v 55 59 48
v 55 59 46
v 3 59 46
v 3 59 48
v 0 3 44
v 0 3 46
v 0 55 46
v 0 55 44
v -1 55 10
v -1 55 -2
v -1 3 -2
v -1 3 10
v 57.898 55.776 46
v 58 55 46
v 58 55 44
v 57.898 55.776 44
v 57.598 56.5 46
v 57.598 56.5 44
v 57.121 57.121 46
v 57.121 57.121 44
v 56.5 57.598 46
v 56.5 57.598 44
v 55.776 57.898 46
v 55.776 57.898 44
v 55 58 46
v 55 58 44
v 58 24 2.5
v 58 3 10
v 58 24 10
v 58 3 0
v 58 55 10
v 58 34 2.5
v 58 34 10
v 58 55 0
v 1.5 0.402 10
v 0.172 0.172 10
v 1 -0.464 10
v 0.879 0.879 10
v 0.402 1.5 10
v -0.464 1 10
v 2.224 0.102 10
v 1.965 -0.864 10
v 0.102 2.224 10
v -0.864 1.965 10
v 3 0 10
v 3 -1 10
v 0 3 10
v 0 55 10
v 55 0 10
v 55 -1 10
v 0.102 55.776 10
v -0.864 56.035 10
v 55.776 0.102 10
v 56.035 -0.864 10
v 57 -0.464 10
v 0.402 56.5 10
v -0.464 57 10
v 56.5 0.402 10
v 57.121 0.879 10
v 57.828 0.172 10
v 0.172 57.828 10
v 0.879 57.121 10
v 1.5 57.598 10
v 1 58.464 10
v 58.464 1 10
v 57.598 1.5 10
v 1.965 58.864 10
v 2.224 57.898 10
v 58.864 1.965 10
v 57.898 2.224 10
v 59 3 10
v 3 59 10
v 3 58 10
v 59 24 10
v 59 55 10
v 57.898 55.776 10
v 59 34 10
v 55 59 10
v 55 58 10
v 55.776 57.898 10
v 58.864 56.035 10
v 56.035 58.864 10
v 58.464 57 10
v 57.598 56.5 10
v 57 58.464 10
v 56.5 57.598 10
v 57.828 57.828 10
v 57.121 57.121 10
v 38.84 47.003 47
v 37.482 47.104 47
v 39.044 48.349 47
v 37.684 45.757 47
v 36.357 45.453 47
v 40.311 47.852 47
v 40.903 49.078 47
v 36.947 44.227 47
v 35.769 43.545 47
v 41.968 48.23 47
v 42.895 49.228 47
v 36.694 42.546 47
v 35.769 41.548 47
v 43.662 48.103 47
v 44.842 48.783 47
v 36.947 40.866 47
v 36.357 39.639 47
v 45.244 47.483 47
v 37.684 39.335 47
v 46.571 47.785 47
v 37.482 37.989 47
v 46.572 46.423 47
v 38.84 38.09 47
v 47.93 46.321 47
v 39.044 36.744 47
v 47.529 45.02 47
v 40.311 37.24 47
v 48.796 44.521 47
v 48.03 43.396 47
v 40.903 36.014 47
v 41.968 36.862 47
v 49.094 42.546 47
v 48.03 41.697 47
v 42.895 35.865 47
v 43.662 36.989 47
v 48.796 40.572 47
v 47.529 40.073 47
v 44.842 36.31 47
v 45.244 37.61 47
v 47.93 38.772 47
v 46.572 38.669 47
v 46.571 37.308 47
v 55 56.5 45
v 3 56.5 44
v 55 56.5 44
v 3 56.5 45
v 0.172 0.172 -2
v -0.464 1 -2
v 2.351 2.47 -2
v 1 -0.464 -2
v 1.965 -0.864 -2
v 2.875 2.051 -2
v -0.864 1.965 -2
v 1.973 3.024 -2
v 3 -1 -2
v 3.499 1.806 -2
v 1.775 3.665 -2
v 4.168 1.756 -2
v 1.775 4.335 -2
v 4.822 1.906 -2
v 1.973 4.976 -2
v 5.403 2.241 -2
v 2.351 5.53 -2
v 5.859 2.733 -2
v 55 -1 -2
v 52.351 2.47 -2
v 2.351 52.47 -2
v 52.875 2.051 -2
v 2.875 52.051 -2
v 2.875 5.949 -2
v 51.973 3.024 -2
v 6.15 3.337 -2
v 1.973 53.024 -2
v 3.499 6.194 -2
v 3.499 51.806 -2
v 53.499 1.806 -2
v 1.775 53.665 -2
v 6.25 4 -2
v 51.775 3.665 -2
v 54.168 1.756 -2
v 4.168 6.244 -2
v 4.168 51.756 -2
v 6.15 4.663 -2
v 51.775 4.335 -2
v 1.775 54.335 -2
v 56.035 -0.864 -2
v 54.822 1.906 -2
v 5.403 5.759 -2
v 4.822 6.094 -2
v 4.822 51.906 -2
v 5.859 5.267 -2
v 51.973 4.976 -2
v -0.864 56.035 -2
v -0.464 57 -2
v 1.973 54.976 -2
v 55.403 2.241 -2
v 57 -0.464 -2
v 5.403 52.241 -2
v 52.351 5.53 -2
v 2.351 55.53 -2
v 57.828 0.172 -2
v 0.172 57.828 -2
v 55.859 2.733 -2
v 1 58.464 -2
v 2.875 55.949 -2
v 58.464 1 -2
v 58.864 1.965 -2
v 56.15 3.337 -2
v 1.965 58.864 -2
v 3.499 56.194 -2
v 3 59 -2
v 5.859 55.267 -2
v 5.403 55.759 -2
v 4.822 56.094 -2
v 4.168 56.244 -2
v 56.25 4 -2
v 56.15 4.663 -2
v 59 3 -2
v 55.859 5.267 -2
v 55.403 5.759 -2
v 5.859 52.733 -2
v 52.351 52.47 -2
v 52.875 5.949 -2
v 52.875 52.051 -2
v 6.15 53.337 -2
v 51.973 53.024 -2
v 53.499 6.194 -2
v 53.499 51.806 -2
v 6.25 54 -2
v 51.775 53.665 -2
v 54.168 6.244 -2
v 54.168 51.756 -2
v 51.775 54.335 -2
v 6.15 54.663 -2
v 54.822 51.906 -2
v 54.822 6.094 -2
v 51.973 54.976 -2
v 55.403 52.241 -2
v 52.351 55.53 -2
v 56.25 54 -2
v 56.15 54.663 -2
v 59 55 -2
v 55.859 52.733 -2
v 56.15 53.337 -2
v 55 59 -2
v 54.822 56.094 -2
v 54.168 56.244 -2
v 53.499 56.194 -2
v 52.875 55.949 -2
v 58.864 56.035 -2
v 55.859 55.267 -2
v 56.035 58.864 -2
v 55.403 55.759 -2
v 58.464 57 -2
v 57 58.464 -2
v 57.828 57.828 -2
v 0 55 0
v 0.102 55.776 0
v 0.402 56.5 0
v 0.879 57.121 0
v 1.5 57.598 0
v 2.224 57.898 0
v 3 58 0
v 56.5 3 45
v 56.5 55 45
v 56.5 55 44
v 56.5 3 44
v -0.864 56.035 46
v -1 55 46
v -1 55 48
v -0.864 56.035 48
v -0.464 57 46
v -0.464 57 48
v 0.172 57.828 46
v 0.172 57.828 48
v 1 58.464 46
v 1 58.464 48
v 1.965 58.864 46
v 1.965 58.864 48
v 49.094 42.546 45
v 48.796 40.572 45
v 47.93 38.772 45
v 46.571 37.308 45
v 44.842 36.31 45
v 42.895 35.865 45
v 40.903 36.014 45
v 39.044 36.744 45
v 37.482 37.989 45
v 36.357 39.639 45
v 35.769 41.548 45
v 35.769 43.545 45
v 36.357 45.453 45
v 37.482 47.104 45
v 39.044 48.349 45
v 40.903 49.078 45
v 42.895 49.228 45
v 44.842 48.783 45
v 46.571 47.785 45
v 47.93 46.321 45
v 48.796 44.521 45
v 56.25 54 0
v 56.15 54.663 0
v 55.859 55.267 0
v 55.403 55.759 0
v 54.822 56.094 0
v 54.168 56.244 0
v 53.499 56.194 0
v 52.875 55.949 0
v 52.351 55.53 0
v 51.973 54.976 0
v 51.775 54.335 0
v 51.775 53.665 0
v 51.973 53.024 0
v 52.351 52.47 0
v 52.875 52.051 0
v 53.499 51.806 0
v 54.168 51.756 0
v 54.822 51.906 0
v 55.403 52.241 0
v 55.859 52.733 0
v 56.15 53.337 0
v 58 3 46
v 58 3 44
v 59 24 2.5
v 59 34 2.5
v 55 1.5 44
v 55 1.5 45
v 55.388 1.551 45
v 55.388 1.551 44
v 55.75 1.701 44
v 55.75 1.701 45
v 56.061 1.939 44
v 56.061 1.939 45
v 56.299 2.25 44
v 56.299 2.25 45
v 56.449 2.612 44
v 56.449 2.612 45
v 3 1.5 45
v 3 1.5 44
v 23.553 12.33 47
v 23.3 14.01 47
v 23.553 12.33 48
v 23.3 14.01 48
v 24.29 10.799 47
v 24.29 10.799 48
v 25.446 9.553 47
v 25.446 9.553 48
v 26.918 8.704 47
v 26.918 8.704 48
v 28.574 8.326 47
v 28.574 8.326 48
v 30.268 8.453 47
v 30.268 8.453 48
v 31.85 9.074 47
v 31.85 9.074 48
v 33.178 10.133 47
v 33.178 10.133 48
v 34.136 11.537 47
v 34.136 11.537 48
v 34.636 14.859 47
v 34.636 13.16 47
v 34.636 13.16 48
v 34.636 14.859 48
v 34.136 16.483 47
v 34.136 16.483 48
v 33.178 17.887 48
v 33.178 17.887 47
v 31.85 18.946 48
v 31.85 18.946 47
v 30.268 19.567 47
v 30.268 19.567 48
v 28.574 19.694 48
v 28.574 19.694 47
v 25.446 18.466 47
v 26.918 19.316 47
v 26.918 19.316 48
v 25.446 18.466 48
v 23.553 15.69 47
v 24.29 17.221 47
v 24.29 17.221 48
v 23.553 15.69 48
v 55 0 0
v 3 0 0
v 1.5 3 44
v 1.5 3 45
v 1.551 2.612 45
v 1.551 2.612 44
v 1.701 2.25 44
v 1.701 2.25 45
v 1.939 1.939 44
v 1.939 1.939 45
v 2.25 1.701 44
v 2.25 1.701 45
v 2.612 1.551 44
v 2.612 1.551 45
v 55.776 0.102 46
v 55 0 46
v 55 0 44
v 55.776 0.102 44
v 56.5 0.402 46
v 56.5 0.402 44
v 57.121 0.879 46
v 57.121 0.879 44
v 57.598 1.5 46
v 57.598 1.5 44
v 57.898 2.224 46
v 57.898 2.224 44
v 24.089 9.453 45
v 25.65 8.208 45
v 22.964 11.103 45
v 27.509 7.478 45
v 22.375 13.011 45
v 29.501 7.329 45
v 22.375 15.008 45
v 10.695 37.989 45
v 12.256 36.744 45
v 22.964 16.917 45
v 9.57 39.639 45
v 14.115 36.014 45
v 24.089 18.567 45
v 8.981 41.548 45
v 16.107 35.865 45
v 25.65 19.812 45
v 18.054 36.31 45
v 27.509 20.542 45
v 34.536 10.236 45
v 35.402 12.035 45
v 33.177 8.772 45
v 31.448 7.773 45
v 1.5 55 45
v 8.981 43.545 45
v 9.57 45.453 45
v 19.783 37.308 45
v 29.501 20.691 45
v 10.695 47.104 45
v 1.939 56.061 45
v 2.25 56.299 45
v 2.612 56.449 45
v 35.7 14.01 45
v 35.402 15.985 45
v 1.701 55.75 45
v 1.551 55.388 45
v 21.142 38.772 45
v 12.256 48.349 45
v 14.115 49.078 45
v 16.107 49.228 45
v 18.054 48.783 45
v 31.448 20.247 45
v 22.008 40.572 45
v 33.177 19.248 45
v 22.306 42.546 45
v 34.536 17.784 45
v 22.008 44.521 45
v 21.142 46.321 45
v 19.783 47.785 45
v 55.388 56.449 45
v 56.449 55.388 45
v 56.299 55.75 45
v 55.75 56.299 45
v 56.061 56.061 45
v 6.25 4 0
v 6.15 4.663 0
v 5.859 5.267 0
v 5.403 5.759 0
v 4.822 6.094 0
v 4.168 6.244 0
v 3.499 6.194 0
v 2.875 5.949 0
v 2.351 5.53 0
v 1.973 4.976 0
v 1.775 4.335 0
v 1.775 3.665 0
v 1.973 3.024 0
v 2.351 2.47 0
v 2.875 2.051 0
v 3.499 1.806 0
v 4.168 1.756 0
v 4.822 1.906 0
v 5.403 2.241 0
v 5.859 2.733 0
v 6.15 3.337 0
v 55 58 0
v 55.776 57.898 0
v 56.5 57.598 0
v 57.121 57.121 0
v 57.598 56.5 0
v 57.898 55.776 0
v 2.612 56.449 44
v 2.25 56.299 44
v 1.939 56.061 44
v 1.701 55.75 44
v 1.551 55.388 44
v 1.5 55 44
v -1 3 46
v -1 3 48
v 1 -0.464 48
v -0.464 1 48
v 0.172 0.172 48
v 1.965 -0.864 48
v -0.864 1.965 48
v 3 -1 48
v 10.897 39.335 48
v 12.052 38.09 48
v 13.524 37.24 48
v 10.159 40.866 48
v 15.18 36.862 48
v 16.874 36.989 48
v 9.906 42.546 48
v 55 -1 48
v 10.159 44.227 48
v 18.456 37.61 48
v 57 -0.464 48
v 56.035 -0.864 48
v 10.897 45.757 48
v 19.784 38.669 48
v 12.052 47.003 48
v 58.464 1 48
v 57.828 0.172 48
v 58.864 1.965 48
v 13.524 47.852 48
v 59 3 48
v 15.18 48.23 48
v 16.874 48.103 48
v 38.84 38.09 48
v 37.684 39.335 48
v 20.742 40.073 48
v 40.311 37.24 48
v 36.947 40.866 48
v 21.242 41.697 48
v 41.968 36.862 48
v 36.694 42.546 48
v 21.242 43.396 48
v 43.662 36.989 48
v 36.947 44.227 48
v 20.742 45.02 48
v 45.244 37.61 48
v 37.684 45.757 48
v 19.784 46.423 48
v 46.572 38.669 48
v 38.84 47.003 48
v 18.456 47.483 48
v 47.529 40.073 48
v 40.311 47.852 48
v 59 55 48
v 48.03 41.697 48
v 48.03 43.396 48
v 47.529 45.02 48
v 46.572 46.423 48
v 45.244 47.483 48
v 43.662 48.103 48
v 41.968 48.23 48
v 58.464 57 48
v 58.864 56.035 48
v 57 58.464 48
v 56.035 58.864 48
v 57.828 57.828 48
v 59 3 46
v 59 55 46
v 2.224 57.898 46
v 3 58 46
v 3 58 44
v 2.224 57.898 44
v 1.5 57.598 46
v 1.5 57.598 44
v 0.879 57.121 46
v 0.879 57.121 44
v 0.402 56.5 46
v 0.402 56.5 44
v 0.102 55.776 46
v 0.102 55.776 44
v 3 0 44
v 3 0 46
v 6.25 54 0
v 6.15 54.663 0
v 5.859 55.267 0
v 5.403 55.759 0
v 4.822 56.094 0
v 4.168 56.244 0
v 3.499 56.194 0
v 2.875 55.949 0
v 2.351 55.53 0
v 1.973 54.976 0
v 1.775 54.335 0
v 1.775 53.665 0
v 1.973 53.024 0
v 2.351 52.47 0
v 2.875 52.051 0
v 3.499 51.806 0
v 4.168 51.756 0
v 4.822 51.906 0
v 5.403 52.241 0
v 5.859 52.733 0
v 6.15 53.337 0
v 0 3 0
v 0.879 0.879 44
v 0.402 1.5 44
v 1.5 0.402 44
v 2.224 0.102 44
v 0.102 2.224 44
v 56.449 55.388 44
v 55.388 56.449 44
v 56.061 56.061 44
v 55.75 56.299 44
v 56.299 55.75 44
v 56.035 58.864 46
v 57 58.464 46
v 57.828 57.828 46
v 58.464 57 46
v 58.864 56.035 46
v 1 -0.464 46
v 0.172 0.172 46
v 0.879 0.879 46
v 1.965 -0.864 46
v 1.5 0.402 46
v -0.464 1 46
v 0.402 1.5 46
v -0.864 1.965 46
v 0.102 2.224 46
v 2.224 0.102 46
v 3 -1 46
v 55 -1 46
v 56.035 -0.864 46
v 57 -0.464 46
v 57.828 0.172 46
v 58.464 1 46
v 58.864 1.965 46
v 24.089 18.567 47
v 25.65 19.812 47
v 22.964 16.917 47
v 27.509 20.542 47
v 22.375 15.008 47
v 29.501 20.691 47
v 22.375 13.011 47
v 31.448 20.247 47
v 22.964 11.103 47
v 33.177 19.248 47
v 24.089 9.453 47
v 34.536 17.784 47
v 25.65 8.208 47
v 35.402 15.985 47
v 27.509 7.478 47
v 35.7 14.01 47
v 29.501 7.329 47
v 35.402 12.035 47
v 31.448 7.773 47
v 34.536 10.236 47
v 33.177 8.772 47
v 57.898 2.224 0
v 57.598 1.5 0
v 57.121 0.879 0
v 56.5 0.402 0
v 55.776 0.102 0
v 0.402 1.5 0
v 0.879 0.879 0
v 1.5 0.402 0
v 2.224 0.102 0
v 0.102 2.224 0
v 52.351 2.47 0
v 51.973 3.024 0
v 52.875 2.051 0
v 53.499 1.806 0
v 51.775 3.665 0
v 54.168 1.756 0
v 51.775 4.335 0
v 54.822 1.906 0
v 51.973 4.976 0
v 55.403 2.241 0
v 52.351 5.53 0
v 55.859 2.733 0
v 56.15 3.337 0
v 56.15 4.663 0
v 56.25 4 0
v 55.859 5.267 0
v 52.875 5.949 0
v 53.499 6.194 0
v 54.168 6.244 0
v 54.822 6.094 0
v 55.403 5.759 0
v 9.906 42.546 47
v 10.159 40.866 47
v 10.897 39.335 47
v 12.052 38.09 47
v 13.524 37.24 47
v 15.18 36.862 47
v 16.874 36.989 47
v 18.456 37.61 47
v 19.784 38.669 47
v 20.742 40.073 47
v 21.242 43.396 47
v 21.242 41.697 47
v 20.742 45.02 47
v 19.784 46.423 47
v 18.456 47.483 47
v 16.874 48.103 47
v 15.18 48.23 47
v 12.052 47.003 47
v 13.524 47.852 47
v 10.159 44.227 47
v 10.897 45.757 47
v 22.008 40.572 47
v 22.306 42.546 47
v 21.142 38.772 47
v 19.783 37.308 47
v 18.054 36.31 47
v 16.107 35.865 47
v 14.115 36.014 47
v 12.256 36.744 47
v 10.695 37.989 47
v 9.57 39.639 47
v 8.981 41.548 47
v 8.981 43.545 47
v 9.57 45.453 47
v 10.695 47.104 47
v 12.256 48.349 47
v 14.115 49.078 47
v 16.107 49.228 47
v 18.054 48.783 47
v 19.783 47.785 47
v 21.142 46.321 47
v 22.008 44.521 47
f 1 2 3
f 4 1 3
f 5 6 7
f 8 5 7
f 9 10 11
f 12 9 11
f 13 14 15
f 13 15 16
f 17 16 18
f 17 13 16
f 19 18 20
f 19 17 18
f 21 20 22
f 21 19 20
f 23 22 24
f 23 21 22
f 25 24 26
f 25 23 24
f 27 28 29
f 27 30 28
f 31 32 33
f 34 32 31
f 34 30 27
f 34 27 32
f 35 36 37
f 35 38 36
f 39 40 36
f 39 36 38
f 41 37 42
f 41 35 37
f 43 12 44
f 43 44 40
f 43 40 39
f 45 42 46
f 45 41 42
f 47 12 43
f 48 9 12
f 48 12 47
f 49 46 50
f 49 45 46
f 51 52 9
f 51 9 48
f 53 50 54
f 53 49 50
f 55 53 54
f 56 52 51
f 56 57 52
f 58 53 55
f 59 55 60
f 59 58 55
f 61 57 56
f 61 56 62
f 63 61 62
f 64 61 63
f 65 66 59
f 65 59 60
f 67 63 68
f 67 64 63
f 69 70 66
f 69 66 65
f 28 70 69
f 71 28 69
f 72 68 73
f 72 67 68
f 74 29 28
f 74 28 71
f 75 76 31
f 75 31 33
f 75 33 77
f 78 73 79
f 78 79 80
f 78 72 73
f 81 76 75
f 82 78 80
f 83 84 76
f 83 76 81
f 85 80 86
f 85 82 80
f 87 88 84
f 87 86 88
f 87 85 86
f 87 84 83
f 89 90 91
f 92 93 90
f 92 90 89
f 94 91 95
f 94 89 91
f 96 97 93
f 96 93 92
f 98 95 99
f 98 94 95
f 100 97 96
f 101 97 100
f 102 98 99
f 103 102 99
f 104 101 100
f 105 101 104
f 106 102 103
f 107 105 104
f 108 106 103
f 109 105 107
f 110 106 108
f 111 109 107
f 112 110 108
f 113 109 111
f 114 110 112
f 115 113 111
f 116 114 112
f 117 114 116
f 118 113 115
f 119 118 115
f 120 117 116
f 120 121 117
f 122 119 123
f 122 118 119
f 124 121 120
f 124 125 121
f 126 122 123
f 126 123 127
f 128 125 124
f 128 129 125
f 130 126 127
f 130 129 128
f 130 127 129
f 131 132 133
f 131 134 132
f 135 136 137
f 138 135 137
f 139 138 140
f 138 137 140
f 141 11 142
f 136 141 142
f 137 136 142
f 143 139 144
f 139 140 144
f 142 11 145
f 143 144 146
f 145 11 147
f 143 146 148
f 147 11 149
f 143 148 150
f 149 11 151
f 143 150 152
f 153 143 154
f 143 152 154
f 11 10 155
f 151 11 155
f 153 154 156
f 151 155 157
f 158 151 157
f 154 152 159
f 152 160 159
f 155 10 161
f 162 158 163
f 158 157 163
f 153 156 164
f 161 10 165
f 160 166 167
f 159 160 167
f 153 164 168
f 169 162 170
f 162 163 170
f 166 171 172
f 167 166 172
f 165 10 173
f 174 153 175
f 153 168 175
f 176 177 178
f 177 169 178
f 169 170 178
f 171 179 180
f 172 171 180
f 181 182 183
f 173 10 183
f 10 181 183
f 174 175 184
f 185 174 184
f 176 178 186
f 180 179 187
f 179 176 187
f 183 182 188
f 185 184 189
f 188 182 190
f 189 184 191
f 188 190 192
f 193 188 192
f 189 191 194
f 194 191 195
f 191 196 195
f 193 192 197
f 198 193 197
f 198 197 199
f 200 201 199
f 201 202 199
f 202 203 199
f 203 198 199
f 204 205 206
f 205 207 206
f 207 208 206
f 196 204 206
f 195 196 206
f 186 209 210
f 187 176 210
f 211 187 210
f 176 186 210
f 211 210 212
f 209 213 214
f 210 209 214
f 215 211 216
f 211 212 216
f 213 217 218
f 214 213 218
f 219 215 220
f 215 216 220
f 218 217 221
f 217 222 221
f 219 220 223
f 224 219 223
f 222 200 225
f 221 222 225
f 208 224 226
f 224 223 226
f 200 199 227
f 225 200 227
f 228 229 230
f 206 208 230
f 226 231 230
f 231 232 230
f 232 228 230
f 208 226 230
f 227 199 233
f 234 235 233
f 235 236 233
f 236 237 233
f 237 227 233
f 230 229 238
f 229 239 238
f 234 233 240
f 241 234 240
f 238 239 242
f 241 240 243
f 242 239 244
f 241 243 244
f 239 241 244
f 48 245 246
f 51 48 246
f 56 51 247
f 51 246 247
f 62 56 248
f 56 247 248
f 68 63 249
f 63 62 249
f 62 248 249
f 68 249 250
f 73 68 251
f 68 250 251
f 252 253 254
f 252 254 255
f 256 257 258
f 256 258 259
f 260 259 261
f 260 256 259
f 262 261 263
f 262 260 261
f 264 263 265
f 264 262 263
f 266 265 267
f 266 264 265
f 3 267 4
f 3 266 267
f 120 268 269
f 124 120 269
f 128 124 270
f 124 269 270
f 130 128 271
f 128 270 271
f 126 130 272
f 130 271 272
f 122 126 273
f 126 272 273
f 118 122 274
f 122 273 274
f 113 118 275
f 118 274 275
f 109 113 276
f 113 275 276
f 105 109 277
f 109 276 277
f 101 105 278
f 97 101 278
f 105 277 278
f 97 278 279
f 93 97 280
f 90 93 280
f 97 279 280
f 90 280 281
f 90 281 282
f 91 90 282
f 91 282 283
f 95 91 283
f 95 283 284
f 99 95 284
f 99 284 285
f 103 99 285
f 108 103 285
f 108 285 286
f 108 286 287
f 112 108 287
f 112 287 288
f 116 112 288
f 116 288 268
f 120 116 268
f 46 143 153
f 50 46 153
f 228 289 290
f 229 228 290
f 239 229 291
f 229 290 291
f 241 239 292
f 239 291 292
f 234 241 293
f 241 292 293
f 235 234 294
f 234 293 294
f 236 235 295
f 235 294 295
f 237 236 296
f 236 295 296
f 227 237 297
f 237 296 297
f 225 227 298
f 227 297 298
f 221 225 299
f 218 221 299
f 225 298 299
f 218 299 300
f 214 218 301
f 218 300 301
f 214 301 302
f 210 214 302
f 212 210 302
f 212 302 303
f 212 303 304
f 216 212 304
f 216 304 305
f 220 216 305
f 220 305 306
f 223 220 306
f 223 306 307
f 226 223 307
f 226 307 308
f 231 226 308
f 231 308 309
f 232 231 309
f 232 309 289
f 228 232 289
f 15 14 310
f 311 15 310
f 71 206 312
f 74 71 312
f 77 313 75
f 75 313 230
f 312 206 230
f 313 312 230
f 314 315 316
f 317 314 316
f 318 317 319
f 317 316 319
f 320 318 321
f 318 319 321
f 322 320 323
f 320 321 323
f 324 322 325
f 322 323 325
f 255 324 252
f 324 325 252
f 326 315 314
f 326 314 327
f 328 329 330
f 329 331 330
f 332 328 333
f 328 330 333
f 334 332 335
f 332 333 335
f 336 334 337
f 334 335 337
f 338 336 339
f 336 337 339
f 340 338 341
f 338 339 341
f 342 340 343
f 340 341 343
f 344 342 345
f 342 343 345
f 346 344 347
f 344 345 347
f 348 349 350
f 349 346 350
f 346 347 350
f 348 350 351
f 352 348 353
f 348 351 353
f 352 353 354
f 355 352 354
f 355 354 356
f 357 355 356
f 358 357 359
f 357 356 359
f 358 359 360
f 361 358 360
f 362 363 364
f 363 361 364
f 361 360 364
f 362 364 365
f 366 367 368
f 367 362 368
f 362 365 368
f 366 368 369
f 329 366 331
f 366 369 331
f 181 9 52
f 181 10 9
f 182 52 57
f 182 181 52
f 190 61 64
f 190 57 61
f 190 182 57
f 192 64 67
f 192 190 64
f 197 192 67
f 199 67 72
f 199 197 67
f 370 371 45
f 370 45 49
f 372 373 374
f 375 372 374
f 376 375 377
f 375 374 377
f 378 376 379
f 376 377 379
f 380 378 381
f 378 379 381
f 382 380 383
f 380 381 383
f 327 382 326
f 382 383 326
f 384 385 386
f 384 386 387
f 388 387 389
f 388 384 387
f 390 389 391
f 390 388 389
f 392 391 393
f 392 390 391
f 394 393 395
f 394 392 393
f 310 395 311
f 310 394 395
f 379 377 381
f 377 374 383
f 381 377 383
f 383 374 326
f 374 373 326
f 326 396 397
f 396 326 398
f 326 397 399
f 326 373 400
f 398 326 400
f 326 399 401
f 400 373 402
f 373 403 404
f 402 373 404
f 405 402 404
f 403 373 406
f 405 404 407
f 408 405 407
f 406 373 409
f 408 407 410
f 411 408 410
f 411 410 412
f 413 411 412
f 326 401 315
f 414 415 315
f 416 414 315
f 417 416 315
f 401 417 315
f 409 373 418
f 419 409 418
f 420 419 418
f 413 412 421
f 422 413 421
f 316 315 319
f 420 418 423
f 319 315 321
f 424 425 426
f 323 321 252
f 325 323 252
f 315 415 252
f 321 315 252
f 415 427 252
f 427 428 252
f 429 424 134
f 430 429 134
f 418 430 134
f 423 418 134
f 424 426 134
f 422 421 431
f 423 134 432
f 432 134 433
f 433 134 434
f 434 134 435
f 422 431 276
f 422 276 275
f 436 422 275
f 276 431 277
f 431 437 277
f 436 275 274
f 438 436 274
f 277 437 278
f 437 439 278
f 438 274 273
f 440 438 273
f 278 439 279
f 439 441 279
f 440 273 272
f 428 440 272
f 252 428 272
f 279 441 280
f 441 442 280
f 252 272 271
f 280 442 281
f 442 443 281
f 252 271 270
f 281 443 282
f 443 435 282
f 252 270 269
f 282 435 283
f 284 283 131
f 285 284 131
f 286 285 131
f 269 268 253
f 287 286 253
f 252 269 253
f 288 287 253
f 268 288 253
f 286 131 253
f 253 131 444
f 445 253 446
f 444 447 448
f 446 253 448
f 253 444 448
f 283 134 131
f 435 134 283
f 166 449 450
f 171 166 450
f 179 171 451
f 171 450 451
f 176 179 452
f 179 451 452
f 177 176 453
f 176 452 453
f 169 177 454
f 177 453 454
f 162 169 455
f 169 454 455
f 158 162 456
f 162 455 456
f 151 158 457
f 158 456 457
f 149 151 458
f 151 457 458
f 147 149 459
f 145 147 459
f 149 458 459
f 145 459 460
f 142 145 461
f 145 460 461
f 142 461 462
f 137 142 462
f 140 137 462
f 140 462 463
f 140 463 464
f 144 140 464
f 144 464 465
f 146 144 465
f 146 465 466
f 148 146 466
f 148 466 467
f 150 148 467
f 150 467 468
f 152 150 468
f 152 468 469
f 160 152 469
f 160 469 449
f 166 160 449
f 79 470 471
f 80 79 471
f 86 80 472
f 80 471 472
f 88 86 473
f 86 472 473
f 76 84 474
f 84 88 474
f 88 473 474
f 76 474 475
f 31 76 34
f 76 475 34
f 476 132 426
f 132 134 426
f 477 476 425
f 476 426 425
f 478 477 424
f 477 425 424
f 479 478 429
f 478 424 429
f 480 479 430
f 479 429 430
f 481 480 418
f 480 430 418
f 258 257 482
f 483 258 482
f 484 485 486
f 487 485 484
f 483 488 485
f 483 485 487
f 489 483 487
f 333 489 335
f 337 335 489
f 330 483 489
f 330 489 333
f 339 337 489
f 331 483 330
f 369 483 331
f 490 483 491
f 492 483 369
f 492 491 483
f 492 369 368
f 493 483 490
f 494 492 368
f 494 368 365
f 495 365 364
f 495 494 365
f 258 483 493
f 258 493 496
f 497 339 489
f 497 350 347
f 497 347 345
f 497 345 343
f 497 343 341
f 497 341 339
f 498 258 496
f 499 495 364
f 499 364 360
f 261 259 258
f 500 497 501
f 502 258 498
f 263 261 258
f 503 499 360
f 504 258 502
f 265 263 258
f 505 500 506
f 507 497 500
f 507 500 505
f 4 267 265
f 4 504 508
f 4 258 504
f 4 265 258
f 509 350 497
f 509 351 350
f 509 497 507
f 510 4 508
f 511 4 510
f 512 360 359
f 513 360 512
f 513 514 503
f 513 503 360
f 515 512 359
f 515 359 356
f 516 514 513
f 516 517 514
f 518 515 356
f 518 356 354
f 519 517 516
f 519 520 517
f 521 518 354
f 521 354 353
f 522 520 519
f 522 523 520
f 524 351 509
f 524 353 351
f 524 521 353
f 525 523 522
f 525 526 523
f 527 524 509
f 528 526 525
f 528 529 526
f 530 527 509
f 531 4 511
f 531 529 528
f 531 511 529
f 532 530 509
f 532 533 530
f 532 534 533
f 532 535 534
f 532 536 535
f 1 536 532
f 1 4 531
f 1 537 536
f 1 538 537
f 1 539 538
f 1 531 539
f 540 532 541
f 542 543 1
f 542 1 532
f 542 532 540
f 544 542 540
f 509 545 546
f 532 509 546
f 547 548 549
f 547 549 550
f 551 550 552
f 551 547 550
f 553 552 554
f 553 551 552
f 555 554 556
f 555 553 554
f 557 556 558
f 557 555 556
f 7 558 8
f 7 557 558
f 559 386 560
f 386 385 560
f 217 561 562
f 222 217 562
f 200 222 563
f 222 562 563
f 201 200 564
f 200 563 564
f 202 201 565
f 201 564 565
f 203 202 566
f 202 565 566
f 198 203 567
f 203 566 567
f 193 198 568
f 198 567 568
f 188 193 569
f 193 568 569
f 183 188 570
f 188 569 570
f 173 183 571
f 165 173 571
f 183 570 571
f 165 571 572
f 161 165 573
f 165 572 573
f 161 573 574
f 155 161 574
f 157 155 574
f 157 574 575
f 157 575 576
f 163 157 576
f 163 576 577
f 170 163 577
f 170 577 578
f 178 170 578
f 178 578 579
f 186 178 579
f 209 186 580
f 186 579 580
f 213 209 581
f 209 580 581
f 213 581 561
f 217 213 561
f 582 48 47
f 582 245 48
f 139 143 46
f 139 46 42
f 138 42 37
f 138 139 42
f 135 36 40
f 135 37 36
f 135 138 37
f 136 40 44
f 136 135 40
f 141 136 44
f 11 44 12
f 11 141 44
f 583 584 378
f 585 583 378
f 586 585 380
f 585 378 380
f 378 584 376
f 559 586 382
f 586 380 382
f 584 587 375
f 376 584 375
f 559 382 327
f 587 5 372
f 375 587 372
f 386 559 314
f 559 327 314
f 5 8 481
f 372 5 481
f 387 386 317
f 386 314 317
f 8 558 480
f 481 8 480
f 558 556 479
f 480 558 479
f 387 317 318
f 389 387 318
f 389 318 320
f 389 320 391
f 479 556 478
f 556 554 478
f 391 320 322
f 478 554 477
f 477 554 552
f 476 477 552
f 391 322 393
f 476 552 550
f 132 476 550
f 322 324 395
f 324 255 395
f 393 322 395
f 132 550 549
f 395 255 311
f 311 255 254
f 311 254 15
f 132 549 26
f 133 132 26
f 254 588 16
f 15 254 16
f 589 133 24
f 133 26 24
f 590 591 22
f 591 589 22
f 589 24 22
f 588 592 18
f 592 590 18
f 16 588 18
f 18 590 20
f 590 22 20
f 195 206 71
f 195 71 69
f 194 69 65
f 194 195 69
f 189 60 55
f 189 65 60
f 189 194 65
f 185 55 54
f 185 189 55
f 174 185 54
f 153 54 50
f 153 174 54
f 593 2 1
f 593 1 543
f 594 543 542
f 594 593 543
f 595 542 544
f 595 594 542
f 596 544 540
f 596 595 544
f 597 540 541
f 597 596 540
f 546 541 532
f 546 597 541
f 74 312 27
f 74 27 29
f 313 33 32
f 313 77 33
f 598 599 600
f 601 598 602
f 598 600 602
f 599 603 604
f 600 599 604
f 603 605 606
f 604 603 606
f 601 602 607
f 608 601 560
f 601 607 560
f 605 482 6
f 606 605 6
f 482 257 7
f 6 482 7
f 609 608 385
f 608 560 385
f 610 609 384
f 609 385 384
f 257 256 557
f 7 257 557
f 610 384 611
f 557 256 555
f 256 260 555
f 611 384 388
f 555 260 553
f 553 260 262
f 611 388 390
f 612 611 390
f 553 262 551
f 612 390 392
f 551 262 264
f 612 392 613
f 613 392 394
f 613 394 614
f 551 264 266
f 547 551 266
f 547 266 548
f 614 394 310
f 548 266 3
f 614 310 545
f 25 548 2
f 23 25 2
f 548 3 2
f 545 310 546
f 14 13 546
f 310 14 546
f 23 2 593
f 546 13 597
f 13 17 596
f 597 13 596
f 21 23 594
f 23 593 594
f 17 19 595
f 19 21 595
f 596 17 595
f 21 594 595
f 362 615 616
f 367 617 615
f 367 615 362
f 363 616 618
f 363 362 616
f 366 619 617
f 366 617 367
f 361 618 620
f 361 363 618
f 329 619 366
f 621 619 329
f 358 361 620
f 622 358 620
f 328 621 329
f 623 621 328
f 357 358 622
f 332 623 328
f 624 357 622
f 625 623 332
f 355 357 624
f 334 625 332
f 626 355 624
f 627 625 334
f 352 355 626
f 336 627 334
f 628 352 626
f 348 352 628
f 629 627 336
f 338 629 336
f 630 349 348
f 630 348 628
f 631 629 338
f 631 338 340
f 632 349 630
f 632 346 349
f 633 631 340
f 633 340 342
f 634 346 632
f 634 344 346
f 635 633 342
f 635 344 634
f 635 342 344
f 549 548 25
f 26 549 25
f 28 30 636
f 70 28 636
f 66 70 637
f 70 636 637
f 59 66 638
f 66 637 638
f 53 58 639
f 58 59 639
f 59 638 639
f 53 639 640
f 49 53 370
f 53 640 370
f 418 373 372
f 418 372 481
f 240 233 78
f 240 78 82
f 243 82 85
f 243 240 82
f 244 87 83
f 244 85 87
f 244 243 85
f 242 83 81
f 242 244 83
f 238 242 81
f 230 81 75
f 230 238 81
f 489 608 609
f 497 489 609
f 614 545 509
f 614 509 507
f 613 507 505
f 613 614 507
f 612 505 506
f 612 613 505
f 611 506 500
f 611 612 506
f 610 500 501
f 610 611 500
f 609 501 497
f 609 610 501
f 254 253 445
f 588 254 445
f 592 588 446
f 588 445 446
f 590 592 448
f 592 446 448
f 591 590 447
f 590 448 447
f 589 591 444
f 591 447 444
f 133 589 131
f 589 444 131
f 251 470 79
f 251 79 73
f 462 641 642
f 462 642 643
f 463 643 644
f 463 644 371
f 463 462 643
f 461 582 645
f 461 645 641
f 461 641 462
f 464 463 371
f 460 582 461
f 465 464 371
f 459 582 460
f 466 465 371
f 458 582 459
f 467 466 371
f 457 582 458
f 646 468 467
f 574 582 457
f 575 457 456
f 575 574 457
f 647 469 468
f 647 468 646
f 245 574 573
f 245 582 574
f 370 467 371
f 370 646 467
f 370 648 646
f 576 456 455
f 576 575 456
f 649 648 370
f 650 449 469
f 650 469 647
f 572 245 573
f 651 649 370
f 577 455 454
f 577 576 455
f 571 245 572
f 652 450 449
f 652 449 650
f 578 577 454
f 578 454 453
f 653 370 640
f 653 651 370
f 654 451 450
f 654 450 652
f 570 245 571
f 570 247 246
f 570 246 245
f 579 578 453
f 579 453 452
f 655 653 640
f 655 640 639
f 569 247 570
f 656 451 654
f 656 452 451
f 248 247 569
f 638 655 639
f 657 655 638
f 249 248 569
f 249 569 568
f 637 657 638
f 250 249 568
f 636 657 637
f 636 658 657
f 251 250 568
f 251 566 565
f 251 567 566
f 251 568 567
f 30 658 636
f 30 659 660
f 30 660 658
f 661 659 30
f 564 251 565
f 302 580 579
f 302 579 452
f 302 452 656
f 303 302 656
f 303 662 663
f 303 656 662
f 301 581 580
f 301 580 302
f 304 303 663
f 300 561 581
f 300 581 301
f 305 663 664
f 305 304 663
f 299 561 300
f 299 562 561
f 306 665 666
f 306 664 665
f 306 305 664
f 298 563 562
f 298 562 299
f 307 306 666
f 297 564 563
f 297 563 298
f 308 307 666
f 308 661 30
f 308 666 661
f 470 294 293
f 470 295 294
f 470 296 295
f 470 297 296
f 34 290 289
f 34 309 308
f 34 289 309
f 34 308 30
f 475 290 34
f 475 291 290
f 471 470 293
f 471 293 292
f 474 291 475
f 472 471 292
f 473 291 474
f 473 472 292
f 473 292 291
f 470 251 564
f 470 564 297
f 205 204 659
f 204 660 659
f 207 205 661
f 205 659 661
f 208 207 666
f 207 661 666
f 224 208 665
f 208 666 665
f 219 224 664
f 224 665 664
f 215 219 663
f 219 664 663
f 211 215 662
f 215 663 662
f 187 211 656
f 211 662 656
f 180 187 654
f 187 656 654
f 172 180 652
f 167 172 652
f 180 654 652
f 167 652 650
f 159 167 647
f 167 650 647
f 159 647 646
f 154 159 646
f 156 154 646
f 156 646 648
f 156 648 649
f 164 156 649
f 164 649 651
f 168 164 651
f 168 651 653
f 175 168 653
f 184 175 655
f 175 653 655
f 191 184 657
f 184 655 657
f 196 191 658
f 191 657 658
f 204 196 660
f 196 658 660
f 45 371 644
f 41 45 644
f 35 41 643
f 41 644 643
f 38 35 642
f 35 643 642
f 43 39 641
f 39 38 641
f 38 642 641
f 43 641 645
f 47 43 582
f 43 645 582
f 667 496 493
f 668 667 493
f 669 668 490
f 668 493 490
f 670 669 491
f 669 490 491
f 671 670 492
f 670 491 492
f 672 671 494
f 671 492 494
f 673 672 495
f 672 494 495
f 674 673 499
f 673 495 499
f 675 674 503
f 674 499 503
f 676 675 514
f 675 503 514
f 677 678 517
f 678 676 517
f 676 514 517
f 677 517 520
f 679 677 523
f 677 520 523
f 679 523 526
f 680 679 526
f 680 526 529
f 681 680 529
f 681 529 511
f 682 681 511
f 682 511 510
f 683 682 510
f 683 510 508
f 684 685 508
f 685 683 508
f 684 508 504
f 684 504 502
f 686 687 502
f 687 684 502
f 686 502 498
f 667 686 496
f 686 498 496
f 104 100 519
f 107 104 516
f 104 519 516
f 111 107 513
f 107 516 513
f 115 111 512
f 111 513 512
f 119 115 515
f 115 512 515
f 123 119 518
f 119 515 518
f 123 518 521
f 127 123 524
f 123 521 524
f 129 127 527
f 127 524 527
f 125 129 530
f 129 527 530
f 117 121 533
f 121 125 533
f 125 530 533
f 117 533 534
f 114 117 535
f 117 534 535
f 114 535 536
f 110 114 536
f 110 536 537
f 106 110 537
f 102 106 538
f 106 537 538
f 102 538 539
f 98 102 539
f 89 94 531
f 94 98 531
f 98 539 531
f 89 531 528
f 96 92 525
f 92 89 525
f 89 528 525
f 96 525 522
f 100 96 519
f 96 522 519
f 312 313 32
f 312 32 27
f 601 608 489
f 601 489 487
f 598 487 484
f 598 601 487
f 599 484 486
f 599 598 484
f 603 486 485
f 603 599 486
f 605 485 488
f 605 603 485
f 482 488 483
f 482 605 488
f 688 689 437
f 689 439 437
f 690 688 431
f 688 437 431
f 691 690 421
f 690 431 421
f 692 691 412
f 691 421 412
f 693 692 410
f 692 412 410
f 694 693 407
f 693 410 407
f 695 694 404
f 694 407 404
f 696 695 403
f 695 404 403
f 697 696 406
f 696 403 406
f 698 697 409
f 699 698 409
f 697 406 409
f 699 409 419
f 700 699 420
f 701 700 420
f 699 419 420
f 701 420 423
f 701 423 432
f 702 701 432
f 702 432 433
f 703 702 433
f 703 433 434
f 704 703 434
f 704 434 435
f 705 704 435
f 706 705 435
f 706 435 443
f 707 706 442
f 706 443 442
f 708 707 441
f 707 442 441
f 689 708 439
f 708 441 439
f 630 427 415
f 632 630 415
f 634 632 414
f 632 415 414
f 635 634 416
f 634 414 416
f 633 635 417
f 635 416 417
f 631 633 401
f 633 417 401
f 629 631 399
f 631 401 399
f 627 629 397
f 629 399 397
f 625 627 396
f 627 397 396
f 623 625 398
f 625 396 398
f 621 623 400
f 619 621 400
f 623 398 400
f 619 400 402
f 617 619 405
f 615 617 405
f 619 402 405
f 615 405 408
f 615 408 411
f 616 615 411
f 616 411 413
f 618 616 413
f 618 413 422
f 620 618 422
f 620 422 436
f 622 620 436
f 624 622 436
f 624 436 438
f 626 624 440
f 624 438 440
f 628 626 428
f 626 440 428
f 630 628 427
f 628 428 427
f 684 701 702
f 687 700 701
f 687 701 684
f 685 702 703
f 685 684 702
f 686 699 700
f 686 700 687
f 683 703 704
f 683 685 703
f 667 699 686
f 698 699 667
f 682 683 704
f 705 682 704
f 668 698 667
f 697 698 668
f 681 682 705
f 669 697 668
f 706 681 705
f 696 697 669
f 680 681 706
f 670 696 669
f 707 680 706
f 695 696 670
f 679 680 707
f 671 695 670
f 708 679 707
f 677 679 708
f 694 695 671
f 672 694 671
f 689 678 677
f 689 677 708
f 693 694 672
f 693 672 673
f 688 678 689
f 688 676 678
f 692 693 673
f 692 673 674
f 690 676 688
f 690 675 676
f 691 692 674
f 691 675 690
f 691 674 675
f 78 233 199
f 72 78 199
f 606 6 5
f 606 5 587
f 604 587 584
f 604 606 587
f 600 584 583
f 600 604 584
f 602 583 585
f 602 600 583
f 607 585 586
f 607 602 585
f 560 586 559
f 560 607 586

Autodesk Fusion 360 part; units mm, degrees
sketch "Sketch1" plane through (0, 0, 0) normal (0, 0, 1) x (1, 0, 0)
  line L0 (3, 0) -> (55, 0)
  line L1 (58, 3) -> (58, 55)
  line L2 (55, 58) -> (3, 58)
  line L3 (0, 55) -> (0, 3)
  circle A0 centre (4, 54) radius 2.25
  circle A1 centre (54, 54) radius 2.25
  circle A2 centre (54, 4) radius 2.25
  circle A3 centre (4, 4) radius 2.25
  arc A4 (3, 58) -> (0, 55) centre (3, 55) ccw
  arc A5 (58, 55) -> (55, 58) centre (55, 55) ccw
  arc A6 (55, 0) -> (58, 3) centre (55, 3) ccw
  arc A7 (0, 3) -> (3, 0) centre (3, 3) ccw
  line L4 (55, 59) -> (3, 59)
  arc A8 (3, 59) -> (-1, 55) centre (3, 55) ccw
  line L5 (-1, 55) -> (-1, 3)
  arc A9 (-1, 3) -> (3, -1) centre (3, 3) ccw
  line L6 (3, -1) -> (55, -1)
  arc A10 (55, -1) -> (59, 3) centre (55, 3) ccw
  line L7 (59, 3) -> (59, 55)
  arc A11 (59, 55) -> (55, 59) centre (55, 55) ccw
  point P0 (58, 0)
  point P1 (0, 58)
  dimension "d1" = 58
  dimension "d2" = 58
  dimension "d5" = 4.5
  dimension "d12" = 4.5
  dimension "d13" = 4.5
  dimension "d14" = 4.5
  dimension "d15" = 3
  dimension "d16" = 3
  dimension "d17" = 3
  dimension "d18" = 3
  dimension "d19" = 1
extrude "Extrude1" add sketch "Sketch1" along normal blind 10 contours L4 A8 L5 A9 L6 A10 L7 A11 makes body 1
ref_plane "WorkPlane1" through (29, 29, 46) normal (0, 0, 1) x (1, 0, 0)
sketch "Sketch2" plane through (29, 29, 46) normal (0, 0, 1) x (1, 0, 0)
  line L0 (26, -29) -> (-26, -29)
  arc A0 (-29, -26) -> (-26, -29) centre (-26, -26) ccw
  line L1 (-29, -26) -> (-29, 26)
  arc A1 (-30, -26) -> (-26, -30) centre (-26, -26) ccw
  line L2 (-26, -30) -> (26, -30)
  arc A2 (26, -30) -> (30, -26) centre (26, -26) ccw
  arc A3 (26, -29) -> (29, -26) centre (26, -26) ccw
  line L3 (29, 26) -> (29, -26)
  line L4 (30, -26) -> (30, 26)
  arc A4 (30, 26) -> (26, 30) centre (26, 26) ccw
  arc A5 (29, 26) -> (26, 29) centre (26, 26) ccw
  line L5 (-26, 29) -> (26, 29)
  line L6 (26, 30) -> (-26, 30)
  line L7 (-30, 26) -> (-30, -26)
  arc A6 (-26, 29) -> (-29, 26) centre (-26, 26) ccw
  arc A7 (-26, 30) -> (-30, 26) centre (-26, 26) ccw
  arc A8 (-26, 27.5) -> (-27.5, 26) centre (-26, 26) ccw
  line L8 (-27.5, -26) -> (-27.5, 26)
  arc A9 (-27.5, -26) -> (-26, -27.5) centre (-26, -26) ccw
  line L9 (26, -27.5) -> (-26, -27.5)
  arc A10 (26, -27.5) -> (27.5, -26) centre (26, -26) ccw
  line L10 (27.5, 26) -> (27.5, -26)
  arc A11 (27.5, 26) -> (26, 27.5) centre (26, 26) ccw
  line L11 (-26, 27.5) -> (26, 27.5)
  dimension "d25" = 1.5
extrude "Extrude3" add sketch "Sketch2" along normal blind 2 separate body contours L0 A0 L1 A3 L3 A5 L5 A6 | A1 L2 A2 L4 A4 L6 L7 A7 | A8 L8 A9 L9 A10 L10 A11 L11 makes body 2
sketch "Sketch3" plane through (0, 0, 48) normal (0, 0, 1) x (-1, 0, 0)
  arc A0 (-3, -59) -> (1, -55) centre (-3, -55) ccw
  line L0 (1, -55) -> (1, -3)
  arc A1 (1, -3) -> (-3, 1) centre (-3, -3) ccw
  line L1 (-3, 1) -> (-55, 1)
  arc A2 (-55, 1) -> (-59, -3) centre (-55, -3) ccw
  line L2 (-59, -3) -> (-59, -55)
  arc A3 (-59, -55) -> (-55, -59) centre (-55, -55) ccw
  line L3 (-55, -59) -> (-3, -59)
  line L4 (-29, 1) -> (-29, -59)
  line L5 (-15.6061, -59) -> (-15.6061, -42.5464)
  line L6 (-39, -24.0099) -> (-19, -24.0099)
  line L7 (-19, -24.0099) -> (-19, -4.0099)
  line L8 (-19, -4.0099) -> (-39, -4.0099)
  line L9 (-39, -4.0099) -> (-39, -24.0099)
  line L10 (-39, -24.0099) -> (-19, -4.0099) construction
  line L11 (-19, -24.0099) -> (-39, -4.0099) construction
  line L12 (-25.6061, -32.5464) -> (-5.6061, -32.5464)
  line L13 (-5.6061, -32.5464) -> (-5.6061, -52.5464)
  line L14 (-5.6061, -52.5464) -> (-25.6061, -52.5464)
  line L15 (-25.6061, -52.5464) -> (-25.6061, -32.5464)
  line L16 (-25.6061, -32.5464) -> (-5.6061, -52.5464) construction
  line L17 (-5.6061, -32.5464) -> (-25.6061, -52.5464) construction
  line L18 (-32.3939, -52.5464) -> (-32.3939, -32.5464)
  line L19 (-52.3939, -52.5464) -> (-32.3939, -52.5464)
  line L20 (-52.3939, -32.5464) -> (-52.3939, -52.5464)
  line L21 (-32.3939, -32.5464) -> (-52.3939, -32.5464)
  line L22 (-52.3939, -32.5464) -> (-32.3939, -52.5464) construction
  line L23 (-32.3939, -32.5464) -> (-52.3939, -52.5464) construction
  circle A4 centre (-15.6061, -42.5464) radius 5.7
  circle A5 centre (-42.3939, -42.5464) radius 5.7
  circle A6 centre (-29, -14.0099) radius 5.7
  point P0 (-29, -14.0099)
  point P1 (-29, -14.0099)
  point P2 (-15.6061, -42.5464)
  point P3 (-42.3939, -42.5464)
  dimension "d32" = 20
  dimension "d33" = 20
  dimension "d34" = 20
  dimension "d35" = 20
  dimension "d67" = 11.4
  dimension "d68" = 11.4
  dimension "d69" = 11.4
extrude "Extrude9" add sketch "Sketch2" against normal blind 1 contours A8 L8 A9 L9 A10 L10 A11 L11 bodies 2
extrude "Extrude11" cut sketch "Sketch3" against normal blind 32 contours A4 | L4 A6 | L4 A6 | A5 bodies 2
sketch "Sketch5" plane through (59, 0, 0) normal (1, 0, 0) x (0, 1, 0)
  line L0 (3, 0) -> (55, 0)
  line L1 (55, 0) -> (55, 10)
  line L2 (55, 10) -> (3, 10)
  line L3 (3, 10) -> (3, 0)
  line L4 (34, 2.5) -> (24, 2.5)
  line L5 (24, 2.5) -> (24, 10.5)
  line L6 (24, 10.5) -> (34, 10.5)
  line L7 (34, 10.5) -> (34, 2.5)
  line L8 (34, 2.5) -> (24, 10.5) construction
  line L9 (24, 2.5) -> (34, 10.5) construction
  point P0 (29, 6.5)
  dimension "d47" = 10
  dimension "d48" = 8
extrude "Extrude6" cut sketch "Sketch5" against normal blind 6 contours L2 L5 L6 L7 | L2 L4 L5 L7 bodies 1
extrude "Extrude7" add sketch "Sketch2" against normal blind 2 contours L0 A0 L1 A3 L3 A5 L5 A6 bodies 2
extrude "Extrude8" add sketch "Sketch1" against normal blind 2 contours L0 L1 L2 L3 A4 A5 A6 A7 | L4 A8 L5 A9 L6 A10 L7 A11 bodies 1
sketch "Sketch7" plane through (0, 0, 45) normal (0, 0, -1) x (1, 0, 0)
  circle A0 centre (15.6061, -42.5464) radius 5.7
  circle A1 centre (42.3939, -42.5464) radius 5.7
  circle A2 centre (29, -14.0099) radius 5.7
  arc A3 (3, -1.5) -> (1.5, -3) centre (3, -3) ccw
  line L0 (1.5, -3) -> (1.5, -55)
  arc A4 (1.5, -55) -> (3, -56.5) centre (3, -55) ccw
  line L1 (3, -56.5) -> (55, -56.5)
  arc A5 (55, -56.5) -> (56.5, -55) centre (55, -55) ccw
  line L2 (56.5, -55) -> (56.5, -3)
  arc A6 (56.5, -3) -> (55, -1.5) centre (55, -3) ccw
  line L3 (55, -1.5) -> (3, -1.5)
  circle A7 centre (29, -14.0099) radius 6.7
  circle A8 centre (15.6061, -42.5464) radius 6.7
  circle A9 centre (42.3939, -42.5464) radius 6.7
  dimension "d72" = 13.4
  dimension "d73" = 13.4
  dimension "d74" = 13.4
extrude "Extrude12" cut sketch "Sketch7" against normal blind 2 contours A7 | A8 | A9 bodies 2
